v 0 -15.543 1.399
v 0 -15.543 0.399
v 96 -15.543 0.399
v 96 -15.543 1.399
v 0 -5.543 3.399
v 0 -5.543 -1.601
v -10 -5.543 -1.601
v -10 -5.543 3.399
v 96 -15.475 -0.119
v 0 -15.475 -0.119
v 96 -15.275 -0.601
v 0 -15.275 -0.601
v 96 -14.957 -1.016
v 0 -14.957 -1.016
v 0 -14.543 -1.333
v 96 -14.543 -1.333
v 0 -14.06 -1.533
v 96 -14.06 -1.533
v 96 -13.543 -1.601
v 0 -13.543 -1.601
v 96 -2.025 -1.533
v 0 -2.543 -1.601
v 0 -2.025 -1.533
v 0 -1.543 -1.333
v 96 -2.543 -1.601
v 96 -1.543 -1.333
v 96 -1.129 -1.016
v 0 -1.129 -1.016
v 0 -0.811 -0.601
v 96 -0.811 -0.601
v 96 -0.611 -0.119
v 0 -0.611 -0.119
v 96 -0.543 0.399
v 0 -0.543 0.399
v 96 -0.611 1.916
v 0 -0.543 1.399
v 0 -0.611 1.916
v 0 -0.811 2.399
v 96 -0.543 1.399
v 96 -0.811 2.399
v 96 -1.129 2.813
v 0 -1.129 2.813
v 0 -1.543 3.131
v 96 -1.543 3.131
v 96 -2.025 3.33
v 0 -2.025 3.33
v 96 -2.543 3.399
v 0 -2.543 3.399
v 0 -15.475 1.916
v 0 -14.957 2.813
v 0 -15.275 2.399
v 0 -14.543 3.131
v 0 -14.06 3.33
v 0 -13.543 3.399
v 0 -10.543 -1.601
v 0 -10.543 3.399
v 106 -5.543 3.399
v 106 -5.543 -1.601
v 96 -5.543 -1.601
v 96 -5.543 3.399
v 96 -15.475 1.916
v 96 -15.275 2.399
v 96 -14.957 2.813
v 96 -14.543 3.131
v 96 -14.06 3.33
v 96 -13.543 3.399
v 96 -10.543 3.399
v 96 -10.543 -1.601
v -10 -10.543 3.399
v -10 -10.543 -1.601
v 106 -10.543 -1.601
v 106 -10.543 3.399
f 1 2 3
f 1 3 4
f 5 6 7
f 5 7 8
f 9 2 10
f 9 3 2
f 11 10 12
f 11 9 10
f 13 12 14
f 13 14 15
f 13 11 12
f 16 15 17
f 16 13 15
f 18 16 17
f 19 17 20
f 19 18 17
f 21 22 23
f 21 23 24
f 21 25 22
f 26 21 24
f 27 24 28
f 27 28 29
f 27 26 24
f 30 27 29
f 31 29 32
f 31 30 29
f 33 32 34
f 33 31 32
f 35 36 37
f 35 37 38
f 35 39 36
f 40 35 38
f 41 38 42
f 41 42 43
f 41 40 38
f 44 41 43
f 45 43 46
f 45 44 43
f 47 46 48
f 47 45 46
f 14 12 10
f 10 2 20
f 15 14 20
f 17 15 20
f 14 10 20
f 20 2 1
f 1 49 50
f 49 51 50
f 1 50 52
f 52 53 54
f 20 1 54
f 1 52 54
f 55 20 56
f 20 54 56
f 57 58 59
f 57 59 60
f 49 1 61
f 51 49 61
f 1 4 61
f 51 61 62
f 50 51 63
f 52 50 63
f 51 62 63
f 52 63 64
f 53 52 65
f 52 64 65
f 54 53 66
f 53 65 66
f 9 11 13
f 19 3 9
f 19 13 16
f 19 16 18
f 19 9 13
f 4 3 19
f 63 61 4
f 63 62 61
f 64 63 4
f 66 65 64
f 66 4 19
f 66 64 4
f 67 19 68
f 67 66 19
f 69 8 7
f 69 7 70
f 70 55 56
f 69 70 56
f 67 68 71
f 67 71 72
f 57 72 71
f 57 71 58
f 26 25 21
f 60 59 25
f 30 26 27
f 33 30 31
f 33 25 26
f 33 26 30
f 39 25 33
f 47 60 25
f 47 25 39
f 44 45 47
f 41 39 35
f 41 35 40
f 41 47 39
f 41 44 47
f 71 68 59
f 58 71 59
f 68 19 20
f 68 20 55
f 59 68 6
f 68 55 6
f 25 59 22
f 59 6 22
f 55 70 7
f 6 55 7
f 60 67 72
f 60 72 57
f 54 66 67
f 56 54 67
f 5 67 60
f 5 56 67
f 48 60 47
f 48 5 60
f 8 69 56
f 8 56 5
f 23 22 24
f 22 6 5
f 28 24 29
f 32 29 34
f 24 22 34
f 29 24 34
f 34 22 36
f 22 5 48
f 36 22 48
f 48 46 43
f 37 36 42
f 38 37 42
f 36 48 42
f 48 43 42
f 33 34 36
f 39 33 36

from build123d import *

# Parameters (mm, degrees)
F0_W     = 15
F0_H     = 5
F1_DEPTH = 100
F2_W     = 5
F2_H     = 5
F3_DEPTH = 10
F4_W     = 5
F4_H     = 5
F5_DEPTH = 10
F6_DEPTH = 4
F7_R     = 2


with BuildPart() as f1:
    # F0 (on Right) → F1 (new body)
    with BuildSketch(Plane.YZ):
        with Locations((-8.0427642167, 0.8986243606)):
            Rectangle(F0_W, F0_H)
    extrude(amount=F1_DEPTH)

    # F2 (on face) → F3 (join)
    with BuildSketch(Plane.YZ.offset(100)):
        with Locations((-8.0427642167, 0.8986243606)):
            Rectangle(F2_W, F2_H)
    extrude(amount=F3_DEPTH)

    # F4 (on face) → F5 (join)
    with BuildSketch(Plane(origin=(0, 0, 0), x_dir=(0, -1, 0), z_dir=(-1, 0, 0))):
        with Locations((8.0427642167, 0.8986243606)):
            Rectangle(F4_W, F4_H)
    extrude(amount=F5_DEPTH)

    # F6 (cut): faces of the model
    f6_faces = [f1.faces().sort_by_distance(p)[0] for p in [
        (100, -13.0427642167, 0.8986243606),
        (100, -3.0427642167, 0.8986243606),
        (110, -8.0427642167, 0.8986243606),
    ]]
    extrude(f6_faces, amount=-F6_DEPTH, mode=Mode.SUBTRACT)

    # F7
    f7_edges = [f1.edges().sort_by_distance(p)[0] for p in [
        (48, -15.542764, 3.398624),
        (48, -0.542764, 3.398624),
        (48, -0.542764, -1.601376),
        (48, -15.542764, -1.601376),
    ]]
    fillet(f7_edges, radius=F7_R)


solid = f1.part
